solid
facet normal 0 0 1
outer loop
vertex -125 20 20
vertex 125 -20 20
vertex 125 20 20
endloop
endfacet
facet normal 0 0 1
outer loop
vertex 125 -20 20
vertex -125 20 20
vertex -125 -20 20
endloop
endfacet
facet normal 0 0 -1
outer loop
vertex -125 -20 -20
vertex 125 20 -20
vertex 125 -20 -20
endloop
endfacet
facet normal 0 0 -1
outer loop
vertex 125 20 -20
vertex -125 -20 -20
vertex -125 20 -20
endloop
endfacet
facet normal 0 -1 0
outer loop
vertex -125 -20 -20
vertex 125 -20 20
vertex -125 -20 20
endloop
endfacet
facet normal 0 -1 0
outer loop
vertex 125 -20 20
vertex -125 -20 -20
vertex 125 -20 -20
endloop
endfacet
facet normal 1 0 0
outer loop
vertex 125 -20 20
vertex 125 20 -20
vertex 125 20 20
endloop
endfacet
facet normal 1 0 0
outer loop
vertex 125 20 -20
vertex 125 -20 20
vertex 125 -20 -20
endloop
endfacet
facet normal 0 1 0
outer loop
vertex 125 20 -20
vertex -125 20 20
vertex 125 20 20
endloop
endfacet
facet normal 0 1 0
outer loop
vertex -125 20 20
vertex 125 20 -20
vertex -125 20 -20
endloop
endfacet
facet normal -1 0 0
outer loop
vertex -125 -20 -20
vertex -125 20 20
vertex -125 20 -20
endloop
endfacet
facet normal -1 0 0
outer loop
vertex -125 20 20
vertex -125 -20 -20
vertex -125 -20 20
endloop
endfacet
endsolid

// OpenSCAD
module reinforcementRod(x,y,z){
    cube([x,y,z],center = true);
}

//size of the box
box_y = 210;
box_x = 230;
box_z = 230;

//size of the arm extension
arm_ex_x = 10;
arm_ex_y = 280;
arm_ex_z = 40;

reinforcementRod(box_x+arm_ex_x*2,40,40);
